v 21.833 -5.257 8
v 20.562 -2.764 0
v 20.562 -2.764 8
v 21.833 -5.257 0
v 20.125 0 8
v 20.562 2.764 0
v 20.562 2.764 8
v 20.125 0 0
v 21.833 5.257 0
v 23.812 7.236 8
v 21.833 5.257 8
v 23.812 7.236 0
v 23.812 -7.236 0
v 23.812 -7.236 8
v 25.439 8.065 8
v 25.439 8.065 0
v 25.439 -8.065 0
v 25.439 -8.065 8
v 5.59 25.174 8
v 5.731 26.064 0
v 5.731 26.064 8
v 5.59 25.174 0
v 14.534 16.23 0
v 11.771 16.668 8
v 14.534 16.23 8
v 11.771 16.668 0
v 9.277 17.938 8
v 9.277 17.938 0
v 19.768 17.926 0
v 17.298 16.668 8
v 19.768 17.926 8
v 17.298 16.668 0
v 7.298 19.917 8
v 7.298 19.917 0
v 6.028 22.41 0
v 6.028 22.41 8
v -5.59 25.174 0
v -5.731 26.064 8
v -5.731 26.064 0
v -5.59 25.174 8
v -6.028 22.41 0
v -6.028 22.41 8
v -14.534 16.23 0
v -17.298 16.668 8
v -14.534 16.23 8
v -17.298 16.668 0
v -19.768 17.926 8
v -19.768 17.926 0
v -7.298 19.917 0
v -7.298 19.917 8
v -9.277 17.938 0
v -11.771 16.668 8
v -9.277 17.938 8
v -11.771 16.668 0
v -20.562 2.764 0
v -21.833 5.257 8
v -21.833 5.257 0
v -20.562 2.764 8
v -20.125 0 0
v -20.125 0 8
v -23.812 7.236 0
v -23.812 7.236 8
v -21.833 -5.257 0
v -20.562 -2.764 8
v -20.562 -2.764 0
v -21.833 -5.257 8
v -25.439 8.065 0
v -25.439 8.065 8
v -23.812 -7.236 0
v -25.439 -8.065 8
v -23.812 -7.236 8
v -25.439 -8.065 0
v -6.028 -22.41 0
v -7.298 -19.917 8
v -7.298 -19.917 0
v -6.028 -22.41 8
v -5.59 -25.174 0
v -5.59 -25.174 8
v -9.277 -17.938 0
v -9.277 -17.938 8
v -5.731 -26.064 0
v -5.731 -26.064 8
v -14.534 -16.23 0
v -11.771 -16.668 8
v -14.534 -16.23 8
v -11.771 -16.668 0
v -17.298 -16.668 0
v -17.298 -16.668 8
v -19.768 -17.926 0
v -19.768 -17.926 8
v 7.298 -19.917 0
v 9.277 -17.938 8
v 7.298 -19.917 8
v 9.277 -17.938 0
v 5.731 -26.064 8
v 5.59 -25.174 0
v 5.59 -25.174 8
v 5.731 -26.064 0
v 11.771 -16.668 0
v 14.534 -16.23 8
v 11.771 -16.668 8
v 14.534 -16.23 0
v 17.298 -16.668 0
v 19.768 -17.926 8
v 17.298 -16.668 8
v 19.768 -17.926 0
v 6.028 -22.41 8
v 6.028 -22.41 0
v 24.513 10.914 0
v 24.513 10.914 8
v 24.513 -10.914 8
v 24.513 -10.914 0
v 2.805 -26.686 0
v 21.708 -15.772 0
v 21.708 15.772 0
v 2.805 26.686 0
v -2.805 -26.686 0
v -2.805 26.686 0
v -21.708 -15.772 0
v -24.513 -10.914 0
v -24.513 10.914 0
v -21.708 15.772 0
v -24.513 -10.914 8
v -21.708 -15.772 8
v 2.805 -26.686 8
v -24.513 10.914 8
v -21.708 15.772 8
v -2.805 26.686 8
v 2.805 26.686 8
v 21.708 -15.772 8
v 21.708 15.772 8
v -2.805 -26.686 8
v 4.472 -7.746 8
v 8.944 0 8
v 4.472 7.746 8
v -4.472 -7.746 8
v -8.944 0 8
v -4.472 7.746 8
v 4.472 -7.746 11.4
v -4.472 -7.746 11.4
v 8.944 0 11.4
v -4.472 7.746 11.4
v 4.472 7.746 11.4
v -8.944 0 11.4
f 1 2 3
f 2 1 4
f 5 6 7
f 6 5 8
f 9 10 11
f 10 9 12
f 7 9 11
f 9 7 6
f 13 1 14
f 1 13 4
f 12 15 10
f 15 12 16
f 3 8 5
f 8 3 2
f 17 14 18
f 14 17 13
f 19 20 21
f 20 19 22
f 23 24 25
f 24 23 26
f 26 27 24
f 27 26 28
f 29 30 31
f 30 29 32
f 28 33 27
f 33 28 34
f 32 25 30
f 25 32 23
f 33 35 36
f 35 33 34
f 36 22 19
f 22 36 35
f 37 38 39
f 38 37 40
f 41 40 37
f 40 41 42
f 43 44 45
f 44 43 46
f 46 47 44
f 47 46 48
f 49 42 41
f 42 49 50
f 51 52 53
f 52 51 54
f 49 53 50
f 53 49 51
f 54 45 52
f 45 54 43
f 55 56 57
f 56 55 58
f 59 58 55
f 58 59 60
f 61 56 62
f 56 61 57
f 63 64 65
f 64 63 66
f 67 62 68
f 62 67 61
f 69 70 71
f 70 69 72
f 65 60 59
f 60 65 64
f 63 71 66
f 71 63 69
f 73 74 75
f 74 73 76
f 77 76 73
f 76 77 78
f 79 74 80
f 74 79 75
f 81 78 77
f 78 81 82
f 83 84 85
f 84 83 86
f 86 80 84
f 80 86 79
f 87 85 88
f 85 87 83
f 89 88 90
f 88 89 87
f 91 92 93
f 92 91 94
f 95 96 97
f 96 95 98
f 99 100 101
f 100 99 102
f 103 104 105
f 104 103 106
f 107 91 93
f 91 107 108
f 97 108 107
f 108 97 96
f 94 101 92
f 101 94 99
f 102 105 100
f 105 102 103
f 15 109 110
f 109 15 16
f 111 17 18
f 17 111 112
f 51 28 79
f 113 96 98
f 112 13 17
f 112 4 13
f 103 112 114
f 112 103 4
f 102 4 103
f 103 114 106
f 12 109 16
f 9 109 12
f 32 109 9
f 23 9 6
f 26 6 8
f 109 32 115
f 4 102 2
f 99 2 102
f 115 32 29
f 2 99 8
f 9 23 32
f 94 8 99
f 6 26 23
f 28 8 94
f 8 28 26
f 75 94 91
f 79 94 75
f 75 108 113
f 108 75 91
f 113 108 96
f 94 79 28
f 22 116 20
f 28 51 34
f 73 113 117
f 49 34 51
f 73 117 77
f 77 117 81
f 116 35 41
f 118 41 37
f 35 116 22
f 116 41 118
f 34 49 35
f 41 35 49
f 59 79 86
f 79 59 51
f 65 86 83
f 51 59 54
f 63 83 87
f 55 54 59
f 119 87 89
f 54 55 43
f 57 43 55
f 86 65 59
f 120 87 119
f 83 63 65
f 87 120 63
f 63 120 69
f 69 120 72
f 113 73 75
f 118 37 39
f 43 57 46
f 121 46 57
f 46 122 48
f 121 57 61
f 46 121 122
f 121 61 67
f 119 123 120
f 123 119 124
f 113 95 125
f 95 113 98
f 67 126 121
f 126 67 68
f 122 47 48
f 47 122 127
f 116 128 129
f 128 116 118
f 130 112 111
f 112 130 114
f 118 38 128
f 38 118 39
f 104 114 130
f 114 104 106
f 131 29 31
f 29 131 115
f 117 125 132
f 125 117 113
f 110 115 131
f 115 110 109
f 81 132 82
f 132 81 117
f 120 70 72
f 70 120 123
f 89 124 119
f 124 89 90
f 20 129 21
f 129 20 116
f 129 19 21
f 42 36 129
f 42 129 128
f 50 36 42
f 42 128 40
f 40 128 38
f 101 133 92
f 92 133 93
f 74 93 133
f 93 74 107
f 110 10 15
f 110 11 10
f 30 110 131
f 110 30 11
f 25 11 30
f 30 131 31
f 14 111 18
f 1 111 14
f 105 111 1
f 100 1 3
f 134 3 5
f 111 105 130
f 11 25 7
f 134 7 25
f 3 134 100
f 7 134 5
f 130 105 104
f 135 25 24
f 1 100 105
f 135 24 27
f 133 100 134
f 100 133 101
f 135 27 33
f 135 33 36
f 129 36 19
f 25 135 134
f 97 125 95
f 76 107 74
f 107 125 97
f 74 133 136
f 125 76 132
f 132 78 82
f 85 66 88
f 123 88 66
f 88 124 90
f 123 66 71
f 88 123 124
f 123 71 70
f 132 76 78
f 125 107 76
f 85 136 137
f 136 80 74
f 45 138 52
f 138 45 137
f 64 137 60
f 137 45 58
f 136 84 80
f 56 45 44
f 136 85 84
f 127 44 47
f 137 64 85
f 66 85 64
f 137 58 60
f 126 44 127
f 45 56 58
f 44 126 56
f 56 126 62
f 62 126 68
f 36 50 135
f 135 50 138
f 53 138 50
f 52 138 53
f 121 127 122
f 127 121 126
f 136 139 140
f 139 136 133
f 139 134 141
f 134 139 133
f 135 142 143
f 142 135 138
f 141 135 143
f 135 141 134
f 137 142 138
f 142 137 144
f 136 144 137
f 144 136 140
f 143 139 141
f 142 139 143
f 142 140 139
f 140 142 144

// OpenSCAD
d = 16;

r = sqrt(4 ^ 2 + 8 ^ 2);
  
color("red")translate([0, 0, d/2])cylinder(r=r, h=3.4, $fn=6);
difference(){
  cylinder(r=r*3, h=d/2);
  translate([0, 0, -1])
  for(theta=[0:60:360]){
     translate(3.25 * r * [cos(theta), sin(theta), 0]) cylinder(r=r, h=d + 2, $fn=20);
  }
}
